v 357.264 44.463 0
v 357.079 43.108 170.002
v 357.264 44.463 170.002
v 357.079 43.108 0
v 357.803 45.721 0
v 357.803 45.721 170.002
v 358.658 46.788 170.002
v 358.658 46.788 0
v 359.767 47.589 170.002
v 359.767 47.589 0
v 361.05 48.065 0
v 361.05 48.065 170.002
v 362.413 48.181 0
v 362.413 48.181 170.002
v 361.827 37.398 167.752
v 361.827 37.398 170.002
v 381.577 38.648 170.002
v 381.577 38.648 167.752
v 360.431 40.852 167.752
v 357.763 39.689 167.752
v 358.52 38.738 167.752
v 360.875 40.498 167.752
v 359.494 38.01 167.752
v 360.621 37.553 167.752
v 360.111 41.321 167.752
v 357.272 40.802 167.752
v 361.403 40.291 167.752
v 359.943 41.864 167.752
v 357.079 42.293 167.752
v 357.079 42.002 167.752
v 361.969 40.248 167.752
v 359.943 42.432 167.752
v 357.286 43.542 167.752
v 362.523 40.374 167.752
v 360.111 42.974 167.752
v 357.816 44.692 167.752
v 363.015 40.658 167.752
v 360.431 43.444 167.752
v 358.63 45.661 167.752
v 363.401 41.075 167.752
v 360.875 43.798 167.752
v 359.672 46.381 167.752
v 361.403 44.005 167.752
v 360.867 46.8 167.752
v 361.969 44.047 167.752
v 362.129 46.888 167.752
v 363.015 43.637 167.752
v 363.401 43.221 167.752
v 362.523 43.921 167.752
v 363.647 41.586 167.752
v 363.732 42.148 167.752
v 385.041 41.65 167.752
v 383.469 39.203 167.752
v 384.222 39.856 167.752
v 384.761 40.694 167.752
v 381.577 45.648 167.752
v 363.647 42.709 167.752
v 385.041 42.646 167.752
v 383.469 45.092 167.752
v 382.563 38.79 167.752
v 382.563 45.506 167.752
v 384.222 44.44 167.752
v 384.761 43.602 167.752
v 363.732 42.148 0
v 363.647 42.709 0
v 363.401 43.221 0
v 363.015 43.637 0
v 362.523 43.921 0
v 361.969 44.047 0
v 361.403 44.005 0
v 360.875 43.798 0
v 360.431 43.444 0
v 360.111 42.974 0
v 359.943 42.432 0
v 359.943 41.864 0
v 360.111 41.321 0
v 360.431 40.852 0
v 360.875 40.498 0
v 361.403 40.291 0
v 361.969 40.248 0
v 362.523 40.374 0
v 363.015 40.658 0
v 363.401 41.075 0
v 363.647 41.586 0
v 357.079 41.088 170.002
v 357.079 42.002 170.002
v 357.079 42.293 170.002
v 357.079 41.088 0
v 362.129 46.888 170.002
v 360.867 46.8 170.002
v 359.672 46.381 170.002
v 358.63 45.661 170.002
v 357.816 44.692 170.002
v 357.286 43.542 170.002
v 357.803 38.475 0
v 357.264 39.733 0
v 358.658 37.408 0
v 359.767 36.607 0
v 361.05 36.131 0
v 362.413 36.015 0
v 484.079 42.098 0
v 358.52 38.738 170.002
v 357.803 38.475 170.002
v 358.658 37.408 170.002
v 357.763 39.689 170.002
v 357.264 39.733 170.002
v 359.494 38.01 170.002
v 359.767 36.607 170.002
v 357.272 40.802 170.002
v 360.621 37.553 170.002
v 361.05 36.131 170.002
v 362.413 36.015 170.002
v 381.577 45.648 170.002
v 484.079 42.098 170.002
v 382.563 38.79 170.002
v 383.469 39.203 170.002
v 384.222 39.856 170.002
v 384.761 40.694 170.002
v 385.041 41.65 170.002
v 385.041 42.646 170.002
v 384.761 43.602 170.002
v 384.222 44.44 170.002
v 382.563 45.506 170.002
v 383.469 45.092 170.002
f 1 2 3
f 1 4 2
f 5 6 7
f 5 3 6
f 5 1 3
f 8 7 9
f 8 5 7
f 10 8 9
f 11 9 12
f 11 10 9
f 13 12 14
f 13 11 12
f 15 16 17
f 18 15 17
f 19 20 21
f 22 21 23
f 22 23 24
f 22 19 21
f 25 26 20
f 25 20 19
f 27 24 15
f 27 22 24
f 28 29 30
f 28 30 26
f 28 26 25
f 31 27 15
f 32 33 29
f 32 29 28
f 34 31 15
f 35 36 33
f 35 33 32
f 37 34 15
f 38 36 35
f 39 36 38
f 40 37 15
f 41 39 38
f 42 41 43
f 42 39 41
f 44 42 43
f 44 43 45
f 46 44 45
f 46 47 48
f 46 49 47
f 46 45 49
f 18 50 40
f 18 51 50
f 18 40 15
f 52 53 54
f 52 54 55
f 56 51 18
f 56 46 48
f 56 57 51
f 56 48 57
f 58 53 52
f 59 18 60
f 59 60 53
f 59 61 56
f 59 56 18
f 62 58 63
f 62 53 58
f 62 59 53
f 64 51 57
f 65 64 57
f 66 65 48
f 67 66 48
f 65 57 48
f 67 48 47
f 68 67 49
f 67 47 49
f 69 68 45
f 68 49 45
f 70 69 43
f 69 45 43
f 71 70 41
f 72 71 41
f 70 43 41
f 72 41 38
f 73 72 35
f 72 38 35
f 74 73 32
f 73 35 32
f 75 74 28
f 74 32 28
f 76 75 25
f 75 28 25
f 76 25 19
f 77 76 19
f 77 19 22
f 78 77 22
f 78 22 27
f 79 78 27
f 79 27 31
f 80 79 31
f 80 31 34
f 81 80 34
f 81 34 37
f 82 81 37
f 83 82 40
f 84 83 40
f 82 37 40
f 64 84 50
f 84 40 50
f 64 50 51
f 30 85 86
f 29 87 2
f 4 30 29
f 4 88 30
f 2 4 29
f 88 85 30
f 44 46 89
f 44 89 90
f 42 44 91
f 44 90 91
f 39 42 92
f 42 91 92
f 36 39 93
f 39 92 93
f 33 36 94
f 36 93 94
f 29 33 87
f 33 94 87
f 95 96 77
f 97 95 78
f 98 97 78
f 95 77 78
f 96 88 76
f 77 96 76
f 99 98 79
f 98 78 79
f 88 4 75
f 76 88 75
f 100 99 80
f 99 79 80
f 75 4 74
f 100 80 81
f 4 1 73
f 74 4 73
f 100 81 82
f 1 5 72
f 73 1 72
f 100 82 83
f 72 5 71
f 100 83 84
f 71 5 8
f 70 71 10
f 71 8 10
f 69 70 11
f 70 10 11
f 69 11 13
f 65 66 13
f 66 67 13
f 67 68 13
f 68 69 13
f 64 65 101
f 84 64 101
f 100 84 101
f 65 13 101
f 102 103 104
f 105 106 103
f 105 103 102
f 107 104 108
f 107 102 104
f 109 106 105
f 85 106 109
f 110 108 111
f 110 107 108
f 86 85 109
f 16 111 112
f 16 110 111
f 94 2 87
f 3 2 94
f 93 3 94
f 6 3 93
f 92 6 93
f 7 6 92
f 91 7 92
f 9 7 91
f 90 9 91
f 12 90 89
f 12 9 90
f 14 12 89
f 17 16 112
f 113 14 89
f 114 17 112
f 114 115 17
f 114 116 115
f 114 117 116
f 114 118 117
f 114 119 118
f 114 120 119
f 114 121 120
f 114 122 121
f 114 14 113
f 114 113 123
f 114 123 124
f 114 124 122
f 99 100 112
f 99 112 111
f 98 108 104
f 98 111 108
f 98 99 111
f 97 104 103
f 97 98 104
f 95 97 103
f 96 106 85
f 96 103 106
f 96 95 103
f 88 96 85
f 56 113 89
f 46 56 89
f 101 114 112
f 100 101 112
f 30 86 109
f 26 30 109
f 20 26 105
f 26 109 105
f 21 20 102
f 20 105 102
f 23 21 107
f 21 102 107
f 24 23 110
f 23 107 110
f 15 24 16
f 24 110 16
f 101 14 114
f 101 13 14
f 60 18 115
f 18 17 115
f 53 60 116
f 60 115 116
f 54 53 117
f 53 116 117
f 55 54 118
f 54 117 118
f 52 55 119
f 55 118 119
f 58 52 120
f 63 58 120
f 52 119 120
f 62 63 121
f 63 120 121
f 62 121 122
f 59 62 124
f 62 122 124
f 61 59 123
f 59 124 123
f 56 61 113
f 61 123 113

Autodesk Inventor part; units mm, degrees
ref_plane "YZ Plane" through (0, 0, 0) normal (1, 0, 0) x (0, 1, 0)
ref_plane "XZ Plane" through (0, 0, 0) normal (0, 1, 0) x (-1, 0, 0)
ref_plane "XY Plane" through (0, 0, 0) normal (0, 0, 1) x (1, 0, 0)
sketch "Sketch1" plane through (0, 0, 0) normal (0, 0, 1) x (1, 0, 0)
  line L0 (357.0794, 41.0884) -> (357.0794, 43.1077)
  line L1 (362.4131, 48.1813) -> (484.0794, 42.098)
  line L2 (484.0794, 42.098) -> (362.4131, 36.0147)
  arc A0 (362.4131, 48.1813) -> (357.0794, 43.1077) centre (362.1594, 43.1077) ccw
  arc A1 (357.0794, 41.0884) -> (362.4131, 36.0147) centre (362.1594, 41.0884) ccw
  point P0 (357.0794, 35.748)
  point P1 (357.0794, 48.448)
  dimension "d0" = 127
  dimension "d1" = 12.7
  dimension "d2" = 5.08
extrude "Extrusion1" add sketch "Sketch1" along normal blind 170.0022
sketch "Sketch2" plane through (0, 0, 170.0022) normal (0, 0, 1) x (1, 0, 0)
  arc A0 (362.1294, 46.8881) -> (362.4259, 37.4357) centre (361.8271, 42.1478) ccw
  arc A1 (381.5771, 38.6478) -> (381.5771, 45.6478) centre (381.5771, 42.1478) ccw
  arc A2 (381.5771, 38.6478) -> (381.5771, 45.6478) centre (381.5771, 42.1478) ccw
  line L0 (361.8271, 37.3978) -> (381.5771, 38.6478)
  line L1 (381.5771, 45.6478) -> (362.1294, 46.8881)
  point P0 (0, 0)
  point P1 (367.7181, 34.9628)
  point P2 (367.4202, 34.9628)
  point P3 (357.0794, 41.9988)
  point P4 (356.8779, 76.4339)
  point P5 (354.6232, 35.4991)
  point P6 (354.3254, 35.4991)
extrude "Extrusion2" cut sketch "Sketch2" against normal blind 2.25 contours L1 A1 L0 A0
sketch "Sketch3" plane through (0, 0, 167.7522) normal (0, 0, 1) x (1, 0, 0)
  line L0 (357.0794, 41.9988) -> (357.0794, 42.2967) projected
  arc A0 (357.0794, 41.9988) -> (361.8271, 37.3978) centre (361.8271, 42.1478) ccw projected
  line L1 (381.5771, 38.6478) -> (361.8271, 37.3978) projected
  arc A1 (381.5771, 38.6478) -> (381.5771, 45.6478) centre (381.5771, 42.1478) ccw projected
  line L2 (362.1294, 46.8881) -> (381.5771, 45.6478) projected
  arc A2 (362.1294, 46.8881) -> (357.0794, 42.2967) centre (361.8271, 42.1478) ccw projected
  circle A3 centre (361.8271, 42.1478) radius 1.905
  point P0 (0, 0)
  dimension "d7" = 3.81
extrude "Extrusion3" cut sketch "Sketch3" against normal blind 170.18 contours A3
properties part number "ElevatorV2"
